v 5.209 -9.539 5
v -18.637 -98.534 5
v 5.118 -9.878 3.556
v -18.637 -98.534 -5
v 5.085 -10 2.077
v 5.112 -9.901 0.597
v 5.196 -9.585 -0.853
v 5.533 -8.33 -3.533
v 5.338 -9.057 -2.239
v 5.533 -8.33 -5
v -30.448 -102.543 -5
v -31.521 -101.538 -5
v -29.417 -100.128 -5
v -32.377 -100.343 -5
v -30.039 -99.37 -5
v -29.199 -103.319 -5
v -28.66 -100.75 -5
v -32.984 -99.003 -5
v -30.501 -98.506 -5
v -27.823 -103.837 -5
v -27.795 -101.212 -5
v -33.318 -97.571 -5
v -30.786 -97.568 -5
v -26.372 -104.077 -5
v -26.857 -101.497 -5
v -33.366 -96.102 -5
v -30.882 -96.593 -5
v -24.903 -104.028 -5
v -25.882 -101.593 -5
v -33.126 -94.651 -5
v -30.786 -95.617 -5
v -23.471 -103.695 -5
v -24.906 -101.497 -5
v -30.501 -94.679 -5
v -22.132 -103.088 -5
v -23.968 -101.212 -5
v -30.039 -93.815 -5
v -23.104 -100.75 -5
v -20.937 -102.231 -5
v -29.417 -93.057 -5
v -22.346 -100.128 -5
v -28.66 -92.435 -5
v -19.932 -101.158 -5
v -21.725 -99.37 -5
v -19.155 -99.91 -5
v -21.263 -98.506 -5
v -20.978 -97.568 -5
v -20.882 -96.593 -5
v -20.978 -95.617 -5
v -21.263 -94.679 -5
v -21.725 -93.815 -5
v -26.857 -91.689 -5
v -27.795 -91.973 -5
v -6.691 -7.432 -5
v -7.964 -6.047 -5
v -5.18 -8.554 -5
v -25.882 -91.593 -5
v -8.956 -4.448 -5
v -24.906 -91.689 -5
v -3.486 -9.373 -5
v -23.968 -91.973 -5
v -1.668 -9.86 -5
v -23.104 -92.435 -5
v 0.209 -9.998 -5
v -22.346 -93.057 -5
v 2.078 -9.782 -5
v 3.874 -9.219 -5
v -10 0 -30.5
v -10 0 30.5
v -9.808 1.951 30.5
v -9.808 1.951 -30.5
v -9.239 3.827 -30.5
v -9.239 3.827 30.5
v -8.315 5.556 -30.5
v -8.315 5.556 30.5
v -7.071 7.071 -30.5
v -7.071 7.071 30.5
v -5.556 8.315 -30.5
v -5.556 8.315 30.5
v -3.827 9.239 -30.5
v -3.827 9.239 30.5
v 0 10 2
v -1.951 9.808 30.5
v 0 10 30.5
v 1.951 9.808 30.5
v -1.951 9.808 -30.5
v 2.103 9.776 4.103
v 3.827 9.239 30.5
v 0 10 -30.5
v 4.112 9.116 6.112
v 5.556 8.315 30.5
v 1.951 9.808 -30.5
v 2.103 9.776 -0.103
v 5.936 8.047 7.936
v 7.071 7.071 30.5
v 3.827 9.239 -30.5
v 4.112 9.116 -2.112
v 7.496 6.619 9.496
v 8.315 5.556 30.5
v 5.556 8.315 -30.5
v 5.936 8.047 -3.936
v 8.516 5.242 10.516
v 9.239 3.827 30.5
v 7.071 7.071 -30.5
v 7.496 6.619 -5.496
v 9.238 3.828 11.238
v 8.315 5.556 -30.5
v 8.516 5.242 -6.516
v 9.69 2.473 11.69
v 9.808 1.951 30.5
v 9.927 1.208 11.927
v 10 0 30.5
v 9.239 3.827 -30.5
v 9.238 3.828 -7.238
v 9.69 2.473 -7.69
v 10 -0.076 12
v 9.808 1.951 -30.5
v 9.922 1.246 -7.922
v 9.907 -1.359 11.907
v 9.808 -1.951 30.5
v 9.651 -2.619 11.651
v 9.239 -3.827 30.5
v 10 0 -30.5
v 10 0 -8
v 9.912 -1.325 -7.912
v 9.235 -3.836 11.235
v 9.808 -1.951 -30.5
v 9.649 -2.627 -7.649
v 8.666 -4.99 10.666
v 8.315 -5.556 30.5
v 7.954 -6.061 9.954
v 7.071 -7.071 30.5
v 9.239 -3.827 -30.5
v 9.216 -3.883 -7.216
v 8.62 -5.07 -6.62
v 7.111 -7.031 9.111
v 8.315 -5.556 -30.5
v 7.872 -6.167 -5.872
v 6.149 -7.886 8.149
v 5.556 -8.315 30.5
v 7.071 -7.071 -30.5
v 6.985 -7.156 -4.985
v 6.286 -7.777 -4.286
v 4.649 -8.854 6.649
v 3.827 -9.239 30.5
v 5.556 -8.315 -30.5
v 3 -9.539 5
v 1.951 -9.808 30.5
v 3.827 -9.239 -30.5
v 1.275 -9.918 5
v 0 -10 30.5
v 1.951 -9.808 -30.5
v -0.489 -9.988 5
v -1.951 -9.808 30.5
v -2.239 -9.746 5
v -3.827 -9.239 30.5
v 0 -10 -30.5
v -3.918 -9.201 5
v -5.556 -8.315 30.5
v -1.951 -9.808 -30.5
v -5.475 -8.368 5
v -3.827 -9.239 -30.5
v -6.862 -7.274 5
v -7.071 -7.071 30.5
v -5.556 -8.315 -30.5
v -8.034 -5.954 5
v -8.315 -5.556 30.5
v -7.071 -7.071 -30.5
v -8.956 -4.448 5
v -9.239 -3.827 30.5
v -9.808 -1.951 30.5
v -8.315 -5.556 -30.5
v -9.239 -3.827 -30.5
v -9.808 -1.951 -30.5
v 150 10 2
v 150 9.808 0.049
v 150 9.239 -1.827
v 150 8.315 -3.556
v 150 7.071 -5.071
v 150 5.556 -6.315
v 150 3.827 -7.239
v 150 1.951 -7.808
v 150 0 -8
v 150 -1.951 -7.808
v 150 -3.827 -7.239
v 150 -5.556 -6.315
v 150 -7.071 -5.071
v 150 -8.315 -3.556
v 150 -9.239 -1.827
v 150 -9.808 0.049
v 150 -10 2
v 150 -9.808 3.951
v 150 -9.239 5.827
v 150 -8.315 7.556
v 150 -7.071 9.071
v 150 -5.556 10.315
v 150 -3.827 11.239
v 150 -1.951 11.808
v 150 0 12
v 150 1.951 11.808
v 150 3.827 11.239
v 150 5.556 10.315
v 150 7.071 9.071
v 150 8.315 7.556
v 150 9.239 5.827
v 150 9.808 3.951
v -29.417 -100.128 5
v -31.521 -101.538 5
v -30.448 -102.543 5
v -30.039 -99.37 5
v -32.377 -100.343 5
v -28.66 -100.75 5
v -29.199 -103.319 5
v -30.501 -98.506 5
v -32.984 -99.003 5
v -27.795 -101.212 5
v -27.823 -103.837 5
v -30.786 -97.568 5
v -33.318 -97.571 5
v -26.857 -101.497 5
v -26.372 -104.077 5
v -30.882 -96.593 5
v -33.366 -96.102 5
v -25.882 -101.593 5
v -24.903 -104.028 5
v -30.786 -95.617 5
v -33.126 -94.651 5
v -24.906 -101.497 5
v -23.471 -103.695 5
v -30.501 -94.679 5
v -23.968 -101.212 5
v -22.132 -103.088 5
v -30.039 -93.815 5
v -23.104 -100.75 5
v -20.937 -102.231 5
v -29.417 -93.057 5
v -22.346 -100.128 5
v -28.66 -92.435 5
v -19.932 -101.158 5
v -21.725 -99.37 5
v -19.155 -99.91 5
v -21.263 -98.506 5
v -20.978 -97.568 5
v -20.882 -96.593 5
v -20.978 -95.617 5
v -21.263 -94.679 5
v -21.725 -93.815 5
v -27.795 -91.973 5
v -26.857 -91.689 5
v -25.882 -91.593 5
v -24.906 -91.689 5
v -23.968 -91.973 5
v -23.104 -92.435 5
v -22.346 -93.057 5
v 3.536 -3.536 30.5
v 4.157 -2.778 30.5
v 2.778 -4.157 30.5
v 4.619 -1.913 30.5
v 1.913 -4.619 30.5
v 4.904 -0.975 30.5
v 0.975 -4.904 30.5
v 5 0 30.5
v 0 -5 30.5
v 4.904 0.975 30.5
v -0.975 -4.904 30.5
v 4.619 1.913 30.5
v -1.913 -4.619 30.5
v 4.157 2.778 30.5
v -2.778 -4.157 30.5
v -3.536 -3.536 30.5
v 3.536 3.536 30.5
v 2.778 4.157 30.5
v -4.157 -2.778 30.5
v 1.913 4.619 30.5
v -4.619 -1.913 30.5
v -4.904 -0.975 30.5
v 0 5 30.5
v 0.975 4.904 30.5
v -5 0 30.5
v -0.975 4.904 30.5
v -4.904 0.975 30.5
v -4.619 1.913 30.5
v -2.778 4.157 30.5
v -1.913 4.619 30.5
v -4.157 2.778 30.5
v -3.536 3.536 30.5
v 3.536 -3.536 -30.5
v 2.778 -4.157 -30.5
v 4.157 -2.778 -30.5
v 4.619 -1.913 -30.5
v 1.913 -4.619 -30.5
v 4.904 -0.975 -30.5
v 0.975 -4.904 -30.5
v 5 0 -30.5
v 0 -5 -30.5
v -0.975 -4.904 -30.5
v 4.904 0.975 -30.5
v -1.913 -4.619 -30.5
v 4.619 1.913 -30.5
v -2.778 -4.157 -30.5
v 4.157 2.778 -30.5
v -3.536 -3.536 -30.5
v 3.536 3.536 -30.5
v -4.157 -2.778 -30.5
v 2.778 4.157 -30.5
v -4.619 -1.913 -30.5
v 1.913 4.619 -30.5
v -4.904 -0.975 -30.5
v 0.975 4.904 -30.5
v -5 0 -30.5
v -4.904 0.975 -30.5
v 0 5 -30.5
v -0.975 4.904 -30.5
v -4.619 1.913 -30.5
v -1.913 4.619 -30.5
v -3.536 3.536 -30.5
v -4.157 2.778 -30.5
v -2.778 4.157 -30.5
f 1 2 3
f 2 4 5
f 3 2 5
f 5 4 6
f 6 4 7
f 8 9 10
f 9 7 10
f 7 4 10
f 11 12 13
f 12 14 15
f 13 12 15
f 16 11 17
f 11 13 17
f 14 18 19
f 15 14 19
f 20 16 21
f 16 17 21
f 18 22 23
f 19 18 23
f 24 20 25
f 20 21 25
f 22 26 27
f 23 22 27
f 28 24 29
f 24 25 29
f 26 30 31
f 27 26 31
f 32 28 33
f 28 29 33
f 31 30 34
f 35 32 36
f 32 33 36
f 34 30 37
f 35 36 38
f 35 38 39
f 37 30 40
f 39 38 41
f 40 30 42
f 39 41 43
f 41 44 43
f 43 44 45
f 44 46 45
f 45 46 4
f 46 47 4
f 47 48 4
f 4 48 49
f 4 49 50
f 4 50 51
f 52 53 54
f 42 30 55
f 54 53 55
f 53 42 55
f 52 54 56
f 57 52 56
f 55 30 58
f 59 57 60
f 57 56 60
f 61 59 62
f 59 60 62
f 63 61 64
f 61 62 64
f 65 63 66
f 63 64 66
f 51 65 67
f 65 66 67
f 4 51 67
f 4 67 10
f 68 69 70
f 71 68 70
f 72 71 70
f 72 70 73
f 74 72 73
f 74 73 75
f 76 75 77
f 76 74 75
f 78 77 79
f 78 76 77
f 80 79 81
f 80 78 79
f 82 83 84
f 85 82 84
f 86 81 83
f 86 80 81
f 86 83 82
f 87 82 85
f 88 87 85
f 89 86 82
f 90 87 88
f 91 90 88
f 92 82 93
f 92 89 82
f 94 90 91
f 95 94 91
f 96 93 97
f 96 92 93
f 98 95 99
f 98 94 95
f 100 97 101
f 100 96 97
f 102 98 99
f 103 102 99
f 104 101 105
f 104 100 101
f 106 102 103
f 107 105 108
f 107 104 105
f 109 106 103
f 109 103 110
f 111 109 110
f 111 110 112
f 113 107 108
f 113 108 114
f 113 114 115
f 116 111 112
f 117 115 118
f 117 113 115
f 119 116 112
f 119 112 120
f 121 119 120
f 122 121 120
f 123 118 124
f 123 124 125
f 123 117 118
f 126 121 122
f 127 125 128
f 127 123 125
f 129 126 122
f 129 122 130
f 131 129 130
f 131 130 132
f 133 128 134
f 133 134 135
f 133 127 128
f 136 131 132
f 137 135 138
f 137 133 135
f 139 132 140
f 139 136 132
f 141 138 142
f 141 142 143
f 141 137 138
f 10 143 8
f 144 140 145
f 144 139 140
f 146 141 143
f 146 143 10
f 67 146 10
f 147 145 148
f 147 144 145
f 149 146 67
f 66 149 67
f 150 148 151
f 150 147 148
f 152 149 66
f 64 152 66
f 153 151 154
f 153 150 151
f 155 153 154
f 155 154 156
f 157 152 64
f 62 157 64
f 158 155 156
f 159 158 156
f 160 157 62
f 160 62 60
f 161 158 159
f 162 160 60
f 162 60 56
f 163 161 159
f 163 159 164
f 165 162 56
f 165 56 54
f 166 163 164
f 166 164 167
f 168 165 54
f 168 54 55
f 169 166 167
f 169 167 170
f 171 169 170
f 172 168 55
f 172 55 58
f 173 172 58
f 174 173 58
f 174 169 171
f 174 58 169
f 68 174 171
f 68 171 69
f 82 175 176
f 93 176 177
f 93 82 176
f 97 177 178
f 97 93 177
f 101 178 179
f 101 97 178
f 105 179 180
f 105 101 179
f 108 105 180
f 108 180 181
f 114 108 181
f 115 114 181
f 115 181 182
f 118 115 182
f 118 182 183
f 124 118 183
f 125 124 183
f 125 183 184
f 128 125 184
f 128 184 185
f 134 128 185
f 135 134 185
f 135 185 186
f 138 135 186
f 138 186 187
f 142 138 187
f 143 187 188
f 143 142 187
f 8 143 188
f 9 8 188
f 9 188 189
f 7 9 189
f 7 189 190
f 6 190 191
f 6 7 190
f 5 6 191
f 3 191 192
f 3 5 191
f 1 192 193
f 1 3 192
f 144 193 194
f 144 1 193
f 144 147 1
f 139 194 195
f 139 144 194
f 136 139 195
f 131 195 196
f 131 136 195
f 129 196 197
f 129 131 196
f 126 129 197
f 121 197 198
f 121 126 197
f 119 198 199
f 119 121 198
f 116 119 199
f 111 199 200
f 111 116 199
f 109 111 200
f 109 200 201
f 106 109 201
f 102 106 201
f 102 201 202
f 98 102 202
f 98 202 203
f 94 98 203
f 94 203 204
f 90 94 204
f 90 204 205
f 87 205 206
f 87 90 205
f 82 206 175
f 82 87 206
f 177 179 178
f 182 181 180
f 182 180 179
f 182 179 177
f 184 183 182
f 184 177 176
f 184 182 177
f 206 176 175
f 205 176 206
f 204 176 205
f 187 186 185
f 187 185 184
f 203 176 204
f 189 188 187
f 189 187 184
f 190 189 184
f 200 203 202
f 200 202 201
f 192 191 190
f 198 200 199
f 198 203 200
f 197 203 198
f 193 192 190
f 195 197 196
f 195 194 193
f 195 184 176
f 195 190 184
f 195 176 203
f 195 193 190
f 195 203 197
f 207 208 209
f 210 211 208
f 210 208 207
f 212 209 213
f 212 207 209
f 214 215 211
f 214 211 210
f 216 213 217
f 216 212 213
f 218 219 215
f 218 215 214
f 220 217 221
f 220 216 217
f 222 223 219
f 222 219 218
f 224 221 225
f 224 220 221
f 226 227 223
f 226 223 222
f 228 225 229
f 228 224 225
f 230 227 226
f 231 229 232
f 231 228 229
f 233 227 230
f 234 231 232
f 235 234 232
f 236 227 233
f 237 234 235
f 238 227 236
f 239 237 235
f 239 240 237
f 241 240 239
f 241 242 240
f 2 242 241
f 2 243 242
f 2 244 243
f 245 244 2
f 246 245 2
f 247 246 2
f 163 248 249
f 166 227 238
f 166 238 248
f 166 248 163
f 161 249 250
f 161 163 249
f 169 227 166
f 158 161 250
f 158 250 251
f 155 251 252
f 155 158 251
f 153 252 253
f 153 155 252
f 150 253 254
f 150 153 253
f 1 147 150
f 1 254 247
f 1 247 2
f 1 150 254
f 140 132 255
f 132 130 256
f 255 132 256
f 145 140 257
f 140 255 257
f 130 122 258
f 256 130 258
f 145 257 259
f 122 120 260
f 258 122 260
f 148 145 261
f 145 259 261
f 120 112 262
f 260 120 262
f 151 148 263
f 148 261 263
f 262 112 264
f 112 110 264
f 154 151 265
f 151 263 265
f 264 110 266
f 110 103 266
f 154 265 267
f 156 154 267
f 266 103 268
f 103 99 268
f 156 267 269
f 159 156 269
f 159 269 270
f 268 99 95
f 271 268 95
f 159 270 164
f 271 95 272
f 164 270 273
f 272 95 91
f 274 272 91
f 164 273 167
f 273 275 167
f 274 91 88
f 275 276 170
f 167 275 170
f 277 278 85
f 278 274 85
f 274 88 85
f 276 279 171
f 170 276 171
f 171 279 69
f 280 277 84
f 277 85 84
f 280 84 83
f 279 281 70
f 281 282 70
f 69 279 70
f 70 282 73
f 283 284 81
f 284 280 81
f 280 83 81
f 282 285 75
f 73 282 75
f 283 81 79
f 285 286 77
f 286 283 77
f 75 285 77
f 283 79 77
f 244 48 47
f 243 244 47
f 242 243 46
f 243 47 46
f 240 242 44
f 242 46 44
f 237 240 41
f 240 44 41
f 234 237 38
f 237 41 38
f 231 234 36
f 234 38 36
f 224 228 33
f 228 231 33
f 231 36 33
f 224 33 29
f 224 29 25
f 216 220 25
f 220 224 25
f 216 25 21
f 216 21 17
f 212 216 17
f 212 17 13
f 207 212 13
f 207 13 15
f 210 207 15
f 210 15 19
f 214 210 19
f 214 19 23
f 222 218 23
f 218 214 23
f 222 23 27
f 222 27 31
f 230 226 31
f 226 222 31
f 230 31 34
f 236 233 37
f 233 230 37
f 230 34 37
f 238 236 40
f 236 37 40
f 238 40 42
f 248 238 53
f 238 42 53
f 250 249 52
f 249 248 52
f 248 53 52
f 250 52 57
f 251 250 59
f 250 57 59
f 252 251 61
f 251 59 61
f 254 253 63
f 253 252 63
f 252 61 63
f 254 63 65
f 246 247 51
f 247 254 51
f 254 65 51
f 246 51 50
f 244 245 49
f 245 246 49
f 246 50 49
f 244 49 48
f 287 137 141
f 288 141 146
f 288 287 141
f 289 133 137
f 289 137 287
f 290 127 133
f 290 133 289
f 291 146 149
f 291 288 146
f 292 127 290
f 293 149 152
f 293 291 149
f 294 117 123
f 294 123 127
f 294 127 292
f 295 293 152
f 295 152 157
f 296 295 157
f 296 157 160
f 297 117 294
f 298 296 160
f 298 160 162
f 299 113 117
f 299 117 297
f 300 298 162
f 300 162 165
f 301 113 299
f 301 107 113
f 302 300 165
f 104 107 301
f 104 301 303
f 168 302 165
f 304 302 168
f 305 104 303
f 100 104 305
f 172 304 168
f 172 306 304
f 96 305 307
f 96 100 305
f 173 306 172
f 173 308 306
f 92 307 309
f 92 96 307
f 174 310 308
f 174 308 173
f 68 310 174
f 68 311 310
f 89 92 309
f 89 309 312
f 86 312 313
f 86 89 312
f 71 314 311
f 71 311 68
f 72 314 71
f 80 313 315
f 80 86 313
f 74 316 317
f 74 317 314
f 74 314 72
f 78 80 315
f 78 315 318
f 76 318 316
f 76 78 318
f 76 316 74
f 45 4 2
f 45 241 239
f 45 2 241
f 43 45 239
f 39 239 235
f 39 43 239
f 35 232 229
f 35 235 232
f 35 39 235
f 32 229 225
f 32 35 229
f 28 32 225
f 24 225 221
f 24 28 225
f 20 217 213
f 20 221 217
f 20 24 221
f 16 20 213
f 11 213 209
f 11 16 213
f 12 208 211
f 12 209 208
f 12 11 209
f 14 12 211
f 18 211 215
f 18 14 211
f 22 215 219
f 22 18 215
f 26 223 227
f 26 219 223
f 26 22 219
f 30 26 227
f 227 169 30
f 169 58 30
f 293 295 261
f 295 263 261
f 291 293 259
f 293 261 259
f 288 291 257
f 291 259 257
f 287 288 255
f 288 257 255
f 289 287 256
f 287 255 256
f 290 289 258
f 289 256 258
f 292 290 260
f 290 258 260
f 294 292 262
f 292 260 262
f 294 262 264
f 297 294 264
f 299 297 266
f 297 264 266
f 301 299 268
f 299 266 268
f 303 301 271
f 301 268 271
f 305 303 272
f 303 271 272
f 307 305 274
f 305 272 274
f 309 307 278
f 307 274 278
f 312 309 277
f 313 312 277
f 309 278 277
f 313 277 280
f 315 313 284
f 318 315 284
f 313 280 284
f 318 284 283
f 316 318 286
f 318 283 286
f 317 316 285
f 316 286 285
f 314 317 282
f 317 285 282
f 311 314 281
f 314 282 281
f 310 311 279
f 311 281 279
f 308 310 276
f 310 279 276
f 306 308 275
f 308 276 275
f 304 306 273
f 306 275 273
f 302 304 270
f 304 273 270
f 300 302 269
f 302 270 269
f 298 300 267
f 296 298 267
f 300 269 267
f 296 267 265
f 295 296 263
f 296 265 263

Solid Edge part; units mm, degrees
sketch "Sketch1" plane through (0, 0, 0) normal (0, -1, 0) x (1, 0, 0)
  line L0 (-10, -30.5) -> (0, -30.5)
  line L1 (0, 30.5) -> (0, -30.5)
  line L2 (0, 30.5) -> (-10, 30.5)
  line L3 (-10, 30.5) -> (-10, -30.5)
revolve "RevolvedProtrusion1" add sketch "Sketch1" angle 360 about axis through (0, 0, 54) along (0, 0, -1)
sketch "Sketch2" plane through (0, 0, 0) normal (1, 0, 0) x (0, 1, 0)
  circle A0 centre (0, 2) radius 10
  dimension "D1" = 32.5
extrude "Protrusion1" add sketch "Sketch2" along normal blind 150
sketch "Sketch3" plane through (0, 0, 0) normal (0, 0, 1) x (1, 0, 0)
  circle A0 centre (-25.8819, -96.5926) radius 5
  line L0 (-8.9564, -4.4479) -> (-33.1263, -94.6514)
  arc A1 (-33.1263, -94.6514) -> (-18.6375, -98.5337) centre (-25.8819, -96.5926) ccw
  line L1 (-18.6375, -98.5337) -> (5.5325, -8.3301)
  arc A2 (5.5325, -8.3301) -> (-8.9564, -4.4479) centre (0, 0) cw
  dimension "D1" = 15
  dimension "D2" = 100
extrude "Styrarm" add sketch "Sketch3" along normal mid plane 10
hole "Hole1" at (0, 0, 30.5) direction (0, 0, -1) diameter 10 end up to next
